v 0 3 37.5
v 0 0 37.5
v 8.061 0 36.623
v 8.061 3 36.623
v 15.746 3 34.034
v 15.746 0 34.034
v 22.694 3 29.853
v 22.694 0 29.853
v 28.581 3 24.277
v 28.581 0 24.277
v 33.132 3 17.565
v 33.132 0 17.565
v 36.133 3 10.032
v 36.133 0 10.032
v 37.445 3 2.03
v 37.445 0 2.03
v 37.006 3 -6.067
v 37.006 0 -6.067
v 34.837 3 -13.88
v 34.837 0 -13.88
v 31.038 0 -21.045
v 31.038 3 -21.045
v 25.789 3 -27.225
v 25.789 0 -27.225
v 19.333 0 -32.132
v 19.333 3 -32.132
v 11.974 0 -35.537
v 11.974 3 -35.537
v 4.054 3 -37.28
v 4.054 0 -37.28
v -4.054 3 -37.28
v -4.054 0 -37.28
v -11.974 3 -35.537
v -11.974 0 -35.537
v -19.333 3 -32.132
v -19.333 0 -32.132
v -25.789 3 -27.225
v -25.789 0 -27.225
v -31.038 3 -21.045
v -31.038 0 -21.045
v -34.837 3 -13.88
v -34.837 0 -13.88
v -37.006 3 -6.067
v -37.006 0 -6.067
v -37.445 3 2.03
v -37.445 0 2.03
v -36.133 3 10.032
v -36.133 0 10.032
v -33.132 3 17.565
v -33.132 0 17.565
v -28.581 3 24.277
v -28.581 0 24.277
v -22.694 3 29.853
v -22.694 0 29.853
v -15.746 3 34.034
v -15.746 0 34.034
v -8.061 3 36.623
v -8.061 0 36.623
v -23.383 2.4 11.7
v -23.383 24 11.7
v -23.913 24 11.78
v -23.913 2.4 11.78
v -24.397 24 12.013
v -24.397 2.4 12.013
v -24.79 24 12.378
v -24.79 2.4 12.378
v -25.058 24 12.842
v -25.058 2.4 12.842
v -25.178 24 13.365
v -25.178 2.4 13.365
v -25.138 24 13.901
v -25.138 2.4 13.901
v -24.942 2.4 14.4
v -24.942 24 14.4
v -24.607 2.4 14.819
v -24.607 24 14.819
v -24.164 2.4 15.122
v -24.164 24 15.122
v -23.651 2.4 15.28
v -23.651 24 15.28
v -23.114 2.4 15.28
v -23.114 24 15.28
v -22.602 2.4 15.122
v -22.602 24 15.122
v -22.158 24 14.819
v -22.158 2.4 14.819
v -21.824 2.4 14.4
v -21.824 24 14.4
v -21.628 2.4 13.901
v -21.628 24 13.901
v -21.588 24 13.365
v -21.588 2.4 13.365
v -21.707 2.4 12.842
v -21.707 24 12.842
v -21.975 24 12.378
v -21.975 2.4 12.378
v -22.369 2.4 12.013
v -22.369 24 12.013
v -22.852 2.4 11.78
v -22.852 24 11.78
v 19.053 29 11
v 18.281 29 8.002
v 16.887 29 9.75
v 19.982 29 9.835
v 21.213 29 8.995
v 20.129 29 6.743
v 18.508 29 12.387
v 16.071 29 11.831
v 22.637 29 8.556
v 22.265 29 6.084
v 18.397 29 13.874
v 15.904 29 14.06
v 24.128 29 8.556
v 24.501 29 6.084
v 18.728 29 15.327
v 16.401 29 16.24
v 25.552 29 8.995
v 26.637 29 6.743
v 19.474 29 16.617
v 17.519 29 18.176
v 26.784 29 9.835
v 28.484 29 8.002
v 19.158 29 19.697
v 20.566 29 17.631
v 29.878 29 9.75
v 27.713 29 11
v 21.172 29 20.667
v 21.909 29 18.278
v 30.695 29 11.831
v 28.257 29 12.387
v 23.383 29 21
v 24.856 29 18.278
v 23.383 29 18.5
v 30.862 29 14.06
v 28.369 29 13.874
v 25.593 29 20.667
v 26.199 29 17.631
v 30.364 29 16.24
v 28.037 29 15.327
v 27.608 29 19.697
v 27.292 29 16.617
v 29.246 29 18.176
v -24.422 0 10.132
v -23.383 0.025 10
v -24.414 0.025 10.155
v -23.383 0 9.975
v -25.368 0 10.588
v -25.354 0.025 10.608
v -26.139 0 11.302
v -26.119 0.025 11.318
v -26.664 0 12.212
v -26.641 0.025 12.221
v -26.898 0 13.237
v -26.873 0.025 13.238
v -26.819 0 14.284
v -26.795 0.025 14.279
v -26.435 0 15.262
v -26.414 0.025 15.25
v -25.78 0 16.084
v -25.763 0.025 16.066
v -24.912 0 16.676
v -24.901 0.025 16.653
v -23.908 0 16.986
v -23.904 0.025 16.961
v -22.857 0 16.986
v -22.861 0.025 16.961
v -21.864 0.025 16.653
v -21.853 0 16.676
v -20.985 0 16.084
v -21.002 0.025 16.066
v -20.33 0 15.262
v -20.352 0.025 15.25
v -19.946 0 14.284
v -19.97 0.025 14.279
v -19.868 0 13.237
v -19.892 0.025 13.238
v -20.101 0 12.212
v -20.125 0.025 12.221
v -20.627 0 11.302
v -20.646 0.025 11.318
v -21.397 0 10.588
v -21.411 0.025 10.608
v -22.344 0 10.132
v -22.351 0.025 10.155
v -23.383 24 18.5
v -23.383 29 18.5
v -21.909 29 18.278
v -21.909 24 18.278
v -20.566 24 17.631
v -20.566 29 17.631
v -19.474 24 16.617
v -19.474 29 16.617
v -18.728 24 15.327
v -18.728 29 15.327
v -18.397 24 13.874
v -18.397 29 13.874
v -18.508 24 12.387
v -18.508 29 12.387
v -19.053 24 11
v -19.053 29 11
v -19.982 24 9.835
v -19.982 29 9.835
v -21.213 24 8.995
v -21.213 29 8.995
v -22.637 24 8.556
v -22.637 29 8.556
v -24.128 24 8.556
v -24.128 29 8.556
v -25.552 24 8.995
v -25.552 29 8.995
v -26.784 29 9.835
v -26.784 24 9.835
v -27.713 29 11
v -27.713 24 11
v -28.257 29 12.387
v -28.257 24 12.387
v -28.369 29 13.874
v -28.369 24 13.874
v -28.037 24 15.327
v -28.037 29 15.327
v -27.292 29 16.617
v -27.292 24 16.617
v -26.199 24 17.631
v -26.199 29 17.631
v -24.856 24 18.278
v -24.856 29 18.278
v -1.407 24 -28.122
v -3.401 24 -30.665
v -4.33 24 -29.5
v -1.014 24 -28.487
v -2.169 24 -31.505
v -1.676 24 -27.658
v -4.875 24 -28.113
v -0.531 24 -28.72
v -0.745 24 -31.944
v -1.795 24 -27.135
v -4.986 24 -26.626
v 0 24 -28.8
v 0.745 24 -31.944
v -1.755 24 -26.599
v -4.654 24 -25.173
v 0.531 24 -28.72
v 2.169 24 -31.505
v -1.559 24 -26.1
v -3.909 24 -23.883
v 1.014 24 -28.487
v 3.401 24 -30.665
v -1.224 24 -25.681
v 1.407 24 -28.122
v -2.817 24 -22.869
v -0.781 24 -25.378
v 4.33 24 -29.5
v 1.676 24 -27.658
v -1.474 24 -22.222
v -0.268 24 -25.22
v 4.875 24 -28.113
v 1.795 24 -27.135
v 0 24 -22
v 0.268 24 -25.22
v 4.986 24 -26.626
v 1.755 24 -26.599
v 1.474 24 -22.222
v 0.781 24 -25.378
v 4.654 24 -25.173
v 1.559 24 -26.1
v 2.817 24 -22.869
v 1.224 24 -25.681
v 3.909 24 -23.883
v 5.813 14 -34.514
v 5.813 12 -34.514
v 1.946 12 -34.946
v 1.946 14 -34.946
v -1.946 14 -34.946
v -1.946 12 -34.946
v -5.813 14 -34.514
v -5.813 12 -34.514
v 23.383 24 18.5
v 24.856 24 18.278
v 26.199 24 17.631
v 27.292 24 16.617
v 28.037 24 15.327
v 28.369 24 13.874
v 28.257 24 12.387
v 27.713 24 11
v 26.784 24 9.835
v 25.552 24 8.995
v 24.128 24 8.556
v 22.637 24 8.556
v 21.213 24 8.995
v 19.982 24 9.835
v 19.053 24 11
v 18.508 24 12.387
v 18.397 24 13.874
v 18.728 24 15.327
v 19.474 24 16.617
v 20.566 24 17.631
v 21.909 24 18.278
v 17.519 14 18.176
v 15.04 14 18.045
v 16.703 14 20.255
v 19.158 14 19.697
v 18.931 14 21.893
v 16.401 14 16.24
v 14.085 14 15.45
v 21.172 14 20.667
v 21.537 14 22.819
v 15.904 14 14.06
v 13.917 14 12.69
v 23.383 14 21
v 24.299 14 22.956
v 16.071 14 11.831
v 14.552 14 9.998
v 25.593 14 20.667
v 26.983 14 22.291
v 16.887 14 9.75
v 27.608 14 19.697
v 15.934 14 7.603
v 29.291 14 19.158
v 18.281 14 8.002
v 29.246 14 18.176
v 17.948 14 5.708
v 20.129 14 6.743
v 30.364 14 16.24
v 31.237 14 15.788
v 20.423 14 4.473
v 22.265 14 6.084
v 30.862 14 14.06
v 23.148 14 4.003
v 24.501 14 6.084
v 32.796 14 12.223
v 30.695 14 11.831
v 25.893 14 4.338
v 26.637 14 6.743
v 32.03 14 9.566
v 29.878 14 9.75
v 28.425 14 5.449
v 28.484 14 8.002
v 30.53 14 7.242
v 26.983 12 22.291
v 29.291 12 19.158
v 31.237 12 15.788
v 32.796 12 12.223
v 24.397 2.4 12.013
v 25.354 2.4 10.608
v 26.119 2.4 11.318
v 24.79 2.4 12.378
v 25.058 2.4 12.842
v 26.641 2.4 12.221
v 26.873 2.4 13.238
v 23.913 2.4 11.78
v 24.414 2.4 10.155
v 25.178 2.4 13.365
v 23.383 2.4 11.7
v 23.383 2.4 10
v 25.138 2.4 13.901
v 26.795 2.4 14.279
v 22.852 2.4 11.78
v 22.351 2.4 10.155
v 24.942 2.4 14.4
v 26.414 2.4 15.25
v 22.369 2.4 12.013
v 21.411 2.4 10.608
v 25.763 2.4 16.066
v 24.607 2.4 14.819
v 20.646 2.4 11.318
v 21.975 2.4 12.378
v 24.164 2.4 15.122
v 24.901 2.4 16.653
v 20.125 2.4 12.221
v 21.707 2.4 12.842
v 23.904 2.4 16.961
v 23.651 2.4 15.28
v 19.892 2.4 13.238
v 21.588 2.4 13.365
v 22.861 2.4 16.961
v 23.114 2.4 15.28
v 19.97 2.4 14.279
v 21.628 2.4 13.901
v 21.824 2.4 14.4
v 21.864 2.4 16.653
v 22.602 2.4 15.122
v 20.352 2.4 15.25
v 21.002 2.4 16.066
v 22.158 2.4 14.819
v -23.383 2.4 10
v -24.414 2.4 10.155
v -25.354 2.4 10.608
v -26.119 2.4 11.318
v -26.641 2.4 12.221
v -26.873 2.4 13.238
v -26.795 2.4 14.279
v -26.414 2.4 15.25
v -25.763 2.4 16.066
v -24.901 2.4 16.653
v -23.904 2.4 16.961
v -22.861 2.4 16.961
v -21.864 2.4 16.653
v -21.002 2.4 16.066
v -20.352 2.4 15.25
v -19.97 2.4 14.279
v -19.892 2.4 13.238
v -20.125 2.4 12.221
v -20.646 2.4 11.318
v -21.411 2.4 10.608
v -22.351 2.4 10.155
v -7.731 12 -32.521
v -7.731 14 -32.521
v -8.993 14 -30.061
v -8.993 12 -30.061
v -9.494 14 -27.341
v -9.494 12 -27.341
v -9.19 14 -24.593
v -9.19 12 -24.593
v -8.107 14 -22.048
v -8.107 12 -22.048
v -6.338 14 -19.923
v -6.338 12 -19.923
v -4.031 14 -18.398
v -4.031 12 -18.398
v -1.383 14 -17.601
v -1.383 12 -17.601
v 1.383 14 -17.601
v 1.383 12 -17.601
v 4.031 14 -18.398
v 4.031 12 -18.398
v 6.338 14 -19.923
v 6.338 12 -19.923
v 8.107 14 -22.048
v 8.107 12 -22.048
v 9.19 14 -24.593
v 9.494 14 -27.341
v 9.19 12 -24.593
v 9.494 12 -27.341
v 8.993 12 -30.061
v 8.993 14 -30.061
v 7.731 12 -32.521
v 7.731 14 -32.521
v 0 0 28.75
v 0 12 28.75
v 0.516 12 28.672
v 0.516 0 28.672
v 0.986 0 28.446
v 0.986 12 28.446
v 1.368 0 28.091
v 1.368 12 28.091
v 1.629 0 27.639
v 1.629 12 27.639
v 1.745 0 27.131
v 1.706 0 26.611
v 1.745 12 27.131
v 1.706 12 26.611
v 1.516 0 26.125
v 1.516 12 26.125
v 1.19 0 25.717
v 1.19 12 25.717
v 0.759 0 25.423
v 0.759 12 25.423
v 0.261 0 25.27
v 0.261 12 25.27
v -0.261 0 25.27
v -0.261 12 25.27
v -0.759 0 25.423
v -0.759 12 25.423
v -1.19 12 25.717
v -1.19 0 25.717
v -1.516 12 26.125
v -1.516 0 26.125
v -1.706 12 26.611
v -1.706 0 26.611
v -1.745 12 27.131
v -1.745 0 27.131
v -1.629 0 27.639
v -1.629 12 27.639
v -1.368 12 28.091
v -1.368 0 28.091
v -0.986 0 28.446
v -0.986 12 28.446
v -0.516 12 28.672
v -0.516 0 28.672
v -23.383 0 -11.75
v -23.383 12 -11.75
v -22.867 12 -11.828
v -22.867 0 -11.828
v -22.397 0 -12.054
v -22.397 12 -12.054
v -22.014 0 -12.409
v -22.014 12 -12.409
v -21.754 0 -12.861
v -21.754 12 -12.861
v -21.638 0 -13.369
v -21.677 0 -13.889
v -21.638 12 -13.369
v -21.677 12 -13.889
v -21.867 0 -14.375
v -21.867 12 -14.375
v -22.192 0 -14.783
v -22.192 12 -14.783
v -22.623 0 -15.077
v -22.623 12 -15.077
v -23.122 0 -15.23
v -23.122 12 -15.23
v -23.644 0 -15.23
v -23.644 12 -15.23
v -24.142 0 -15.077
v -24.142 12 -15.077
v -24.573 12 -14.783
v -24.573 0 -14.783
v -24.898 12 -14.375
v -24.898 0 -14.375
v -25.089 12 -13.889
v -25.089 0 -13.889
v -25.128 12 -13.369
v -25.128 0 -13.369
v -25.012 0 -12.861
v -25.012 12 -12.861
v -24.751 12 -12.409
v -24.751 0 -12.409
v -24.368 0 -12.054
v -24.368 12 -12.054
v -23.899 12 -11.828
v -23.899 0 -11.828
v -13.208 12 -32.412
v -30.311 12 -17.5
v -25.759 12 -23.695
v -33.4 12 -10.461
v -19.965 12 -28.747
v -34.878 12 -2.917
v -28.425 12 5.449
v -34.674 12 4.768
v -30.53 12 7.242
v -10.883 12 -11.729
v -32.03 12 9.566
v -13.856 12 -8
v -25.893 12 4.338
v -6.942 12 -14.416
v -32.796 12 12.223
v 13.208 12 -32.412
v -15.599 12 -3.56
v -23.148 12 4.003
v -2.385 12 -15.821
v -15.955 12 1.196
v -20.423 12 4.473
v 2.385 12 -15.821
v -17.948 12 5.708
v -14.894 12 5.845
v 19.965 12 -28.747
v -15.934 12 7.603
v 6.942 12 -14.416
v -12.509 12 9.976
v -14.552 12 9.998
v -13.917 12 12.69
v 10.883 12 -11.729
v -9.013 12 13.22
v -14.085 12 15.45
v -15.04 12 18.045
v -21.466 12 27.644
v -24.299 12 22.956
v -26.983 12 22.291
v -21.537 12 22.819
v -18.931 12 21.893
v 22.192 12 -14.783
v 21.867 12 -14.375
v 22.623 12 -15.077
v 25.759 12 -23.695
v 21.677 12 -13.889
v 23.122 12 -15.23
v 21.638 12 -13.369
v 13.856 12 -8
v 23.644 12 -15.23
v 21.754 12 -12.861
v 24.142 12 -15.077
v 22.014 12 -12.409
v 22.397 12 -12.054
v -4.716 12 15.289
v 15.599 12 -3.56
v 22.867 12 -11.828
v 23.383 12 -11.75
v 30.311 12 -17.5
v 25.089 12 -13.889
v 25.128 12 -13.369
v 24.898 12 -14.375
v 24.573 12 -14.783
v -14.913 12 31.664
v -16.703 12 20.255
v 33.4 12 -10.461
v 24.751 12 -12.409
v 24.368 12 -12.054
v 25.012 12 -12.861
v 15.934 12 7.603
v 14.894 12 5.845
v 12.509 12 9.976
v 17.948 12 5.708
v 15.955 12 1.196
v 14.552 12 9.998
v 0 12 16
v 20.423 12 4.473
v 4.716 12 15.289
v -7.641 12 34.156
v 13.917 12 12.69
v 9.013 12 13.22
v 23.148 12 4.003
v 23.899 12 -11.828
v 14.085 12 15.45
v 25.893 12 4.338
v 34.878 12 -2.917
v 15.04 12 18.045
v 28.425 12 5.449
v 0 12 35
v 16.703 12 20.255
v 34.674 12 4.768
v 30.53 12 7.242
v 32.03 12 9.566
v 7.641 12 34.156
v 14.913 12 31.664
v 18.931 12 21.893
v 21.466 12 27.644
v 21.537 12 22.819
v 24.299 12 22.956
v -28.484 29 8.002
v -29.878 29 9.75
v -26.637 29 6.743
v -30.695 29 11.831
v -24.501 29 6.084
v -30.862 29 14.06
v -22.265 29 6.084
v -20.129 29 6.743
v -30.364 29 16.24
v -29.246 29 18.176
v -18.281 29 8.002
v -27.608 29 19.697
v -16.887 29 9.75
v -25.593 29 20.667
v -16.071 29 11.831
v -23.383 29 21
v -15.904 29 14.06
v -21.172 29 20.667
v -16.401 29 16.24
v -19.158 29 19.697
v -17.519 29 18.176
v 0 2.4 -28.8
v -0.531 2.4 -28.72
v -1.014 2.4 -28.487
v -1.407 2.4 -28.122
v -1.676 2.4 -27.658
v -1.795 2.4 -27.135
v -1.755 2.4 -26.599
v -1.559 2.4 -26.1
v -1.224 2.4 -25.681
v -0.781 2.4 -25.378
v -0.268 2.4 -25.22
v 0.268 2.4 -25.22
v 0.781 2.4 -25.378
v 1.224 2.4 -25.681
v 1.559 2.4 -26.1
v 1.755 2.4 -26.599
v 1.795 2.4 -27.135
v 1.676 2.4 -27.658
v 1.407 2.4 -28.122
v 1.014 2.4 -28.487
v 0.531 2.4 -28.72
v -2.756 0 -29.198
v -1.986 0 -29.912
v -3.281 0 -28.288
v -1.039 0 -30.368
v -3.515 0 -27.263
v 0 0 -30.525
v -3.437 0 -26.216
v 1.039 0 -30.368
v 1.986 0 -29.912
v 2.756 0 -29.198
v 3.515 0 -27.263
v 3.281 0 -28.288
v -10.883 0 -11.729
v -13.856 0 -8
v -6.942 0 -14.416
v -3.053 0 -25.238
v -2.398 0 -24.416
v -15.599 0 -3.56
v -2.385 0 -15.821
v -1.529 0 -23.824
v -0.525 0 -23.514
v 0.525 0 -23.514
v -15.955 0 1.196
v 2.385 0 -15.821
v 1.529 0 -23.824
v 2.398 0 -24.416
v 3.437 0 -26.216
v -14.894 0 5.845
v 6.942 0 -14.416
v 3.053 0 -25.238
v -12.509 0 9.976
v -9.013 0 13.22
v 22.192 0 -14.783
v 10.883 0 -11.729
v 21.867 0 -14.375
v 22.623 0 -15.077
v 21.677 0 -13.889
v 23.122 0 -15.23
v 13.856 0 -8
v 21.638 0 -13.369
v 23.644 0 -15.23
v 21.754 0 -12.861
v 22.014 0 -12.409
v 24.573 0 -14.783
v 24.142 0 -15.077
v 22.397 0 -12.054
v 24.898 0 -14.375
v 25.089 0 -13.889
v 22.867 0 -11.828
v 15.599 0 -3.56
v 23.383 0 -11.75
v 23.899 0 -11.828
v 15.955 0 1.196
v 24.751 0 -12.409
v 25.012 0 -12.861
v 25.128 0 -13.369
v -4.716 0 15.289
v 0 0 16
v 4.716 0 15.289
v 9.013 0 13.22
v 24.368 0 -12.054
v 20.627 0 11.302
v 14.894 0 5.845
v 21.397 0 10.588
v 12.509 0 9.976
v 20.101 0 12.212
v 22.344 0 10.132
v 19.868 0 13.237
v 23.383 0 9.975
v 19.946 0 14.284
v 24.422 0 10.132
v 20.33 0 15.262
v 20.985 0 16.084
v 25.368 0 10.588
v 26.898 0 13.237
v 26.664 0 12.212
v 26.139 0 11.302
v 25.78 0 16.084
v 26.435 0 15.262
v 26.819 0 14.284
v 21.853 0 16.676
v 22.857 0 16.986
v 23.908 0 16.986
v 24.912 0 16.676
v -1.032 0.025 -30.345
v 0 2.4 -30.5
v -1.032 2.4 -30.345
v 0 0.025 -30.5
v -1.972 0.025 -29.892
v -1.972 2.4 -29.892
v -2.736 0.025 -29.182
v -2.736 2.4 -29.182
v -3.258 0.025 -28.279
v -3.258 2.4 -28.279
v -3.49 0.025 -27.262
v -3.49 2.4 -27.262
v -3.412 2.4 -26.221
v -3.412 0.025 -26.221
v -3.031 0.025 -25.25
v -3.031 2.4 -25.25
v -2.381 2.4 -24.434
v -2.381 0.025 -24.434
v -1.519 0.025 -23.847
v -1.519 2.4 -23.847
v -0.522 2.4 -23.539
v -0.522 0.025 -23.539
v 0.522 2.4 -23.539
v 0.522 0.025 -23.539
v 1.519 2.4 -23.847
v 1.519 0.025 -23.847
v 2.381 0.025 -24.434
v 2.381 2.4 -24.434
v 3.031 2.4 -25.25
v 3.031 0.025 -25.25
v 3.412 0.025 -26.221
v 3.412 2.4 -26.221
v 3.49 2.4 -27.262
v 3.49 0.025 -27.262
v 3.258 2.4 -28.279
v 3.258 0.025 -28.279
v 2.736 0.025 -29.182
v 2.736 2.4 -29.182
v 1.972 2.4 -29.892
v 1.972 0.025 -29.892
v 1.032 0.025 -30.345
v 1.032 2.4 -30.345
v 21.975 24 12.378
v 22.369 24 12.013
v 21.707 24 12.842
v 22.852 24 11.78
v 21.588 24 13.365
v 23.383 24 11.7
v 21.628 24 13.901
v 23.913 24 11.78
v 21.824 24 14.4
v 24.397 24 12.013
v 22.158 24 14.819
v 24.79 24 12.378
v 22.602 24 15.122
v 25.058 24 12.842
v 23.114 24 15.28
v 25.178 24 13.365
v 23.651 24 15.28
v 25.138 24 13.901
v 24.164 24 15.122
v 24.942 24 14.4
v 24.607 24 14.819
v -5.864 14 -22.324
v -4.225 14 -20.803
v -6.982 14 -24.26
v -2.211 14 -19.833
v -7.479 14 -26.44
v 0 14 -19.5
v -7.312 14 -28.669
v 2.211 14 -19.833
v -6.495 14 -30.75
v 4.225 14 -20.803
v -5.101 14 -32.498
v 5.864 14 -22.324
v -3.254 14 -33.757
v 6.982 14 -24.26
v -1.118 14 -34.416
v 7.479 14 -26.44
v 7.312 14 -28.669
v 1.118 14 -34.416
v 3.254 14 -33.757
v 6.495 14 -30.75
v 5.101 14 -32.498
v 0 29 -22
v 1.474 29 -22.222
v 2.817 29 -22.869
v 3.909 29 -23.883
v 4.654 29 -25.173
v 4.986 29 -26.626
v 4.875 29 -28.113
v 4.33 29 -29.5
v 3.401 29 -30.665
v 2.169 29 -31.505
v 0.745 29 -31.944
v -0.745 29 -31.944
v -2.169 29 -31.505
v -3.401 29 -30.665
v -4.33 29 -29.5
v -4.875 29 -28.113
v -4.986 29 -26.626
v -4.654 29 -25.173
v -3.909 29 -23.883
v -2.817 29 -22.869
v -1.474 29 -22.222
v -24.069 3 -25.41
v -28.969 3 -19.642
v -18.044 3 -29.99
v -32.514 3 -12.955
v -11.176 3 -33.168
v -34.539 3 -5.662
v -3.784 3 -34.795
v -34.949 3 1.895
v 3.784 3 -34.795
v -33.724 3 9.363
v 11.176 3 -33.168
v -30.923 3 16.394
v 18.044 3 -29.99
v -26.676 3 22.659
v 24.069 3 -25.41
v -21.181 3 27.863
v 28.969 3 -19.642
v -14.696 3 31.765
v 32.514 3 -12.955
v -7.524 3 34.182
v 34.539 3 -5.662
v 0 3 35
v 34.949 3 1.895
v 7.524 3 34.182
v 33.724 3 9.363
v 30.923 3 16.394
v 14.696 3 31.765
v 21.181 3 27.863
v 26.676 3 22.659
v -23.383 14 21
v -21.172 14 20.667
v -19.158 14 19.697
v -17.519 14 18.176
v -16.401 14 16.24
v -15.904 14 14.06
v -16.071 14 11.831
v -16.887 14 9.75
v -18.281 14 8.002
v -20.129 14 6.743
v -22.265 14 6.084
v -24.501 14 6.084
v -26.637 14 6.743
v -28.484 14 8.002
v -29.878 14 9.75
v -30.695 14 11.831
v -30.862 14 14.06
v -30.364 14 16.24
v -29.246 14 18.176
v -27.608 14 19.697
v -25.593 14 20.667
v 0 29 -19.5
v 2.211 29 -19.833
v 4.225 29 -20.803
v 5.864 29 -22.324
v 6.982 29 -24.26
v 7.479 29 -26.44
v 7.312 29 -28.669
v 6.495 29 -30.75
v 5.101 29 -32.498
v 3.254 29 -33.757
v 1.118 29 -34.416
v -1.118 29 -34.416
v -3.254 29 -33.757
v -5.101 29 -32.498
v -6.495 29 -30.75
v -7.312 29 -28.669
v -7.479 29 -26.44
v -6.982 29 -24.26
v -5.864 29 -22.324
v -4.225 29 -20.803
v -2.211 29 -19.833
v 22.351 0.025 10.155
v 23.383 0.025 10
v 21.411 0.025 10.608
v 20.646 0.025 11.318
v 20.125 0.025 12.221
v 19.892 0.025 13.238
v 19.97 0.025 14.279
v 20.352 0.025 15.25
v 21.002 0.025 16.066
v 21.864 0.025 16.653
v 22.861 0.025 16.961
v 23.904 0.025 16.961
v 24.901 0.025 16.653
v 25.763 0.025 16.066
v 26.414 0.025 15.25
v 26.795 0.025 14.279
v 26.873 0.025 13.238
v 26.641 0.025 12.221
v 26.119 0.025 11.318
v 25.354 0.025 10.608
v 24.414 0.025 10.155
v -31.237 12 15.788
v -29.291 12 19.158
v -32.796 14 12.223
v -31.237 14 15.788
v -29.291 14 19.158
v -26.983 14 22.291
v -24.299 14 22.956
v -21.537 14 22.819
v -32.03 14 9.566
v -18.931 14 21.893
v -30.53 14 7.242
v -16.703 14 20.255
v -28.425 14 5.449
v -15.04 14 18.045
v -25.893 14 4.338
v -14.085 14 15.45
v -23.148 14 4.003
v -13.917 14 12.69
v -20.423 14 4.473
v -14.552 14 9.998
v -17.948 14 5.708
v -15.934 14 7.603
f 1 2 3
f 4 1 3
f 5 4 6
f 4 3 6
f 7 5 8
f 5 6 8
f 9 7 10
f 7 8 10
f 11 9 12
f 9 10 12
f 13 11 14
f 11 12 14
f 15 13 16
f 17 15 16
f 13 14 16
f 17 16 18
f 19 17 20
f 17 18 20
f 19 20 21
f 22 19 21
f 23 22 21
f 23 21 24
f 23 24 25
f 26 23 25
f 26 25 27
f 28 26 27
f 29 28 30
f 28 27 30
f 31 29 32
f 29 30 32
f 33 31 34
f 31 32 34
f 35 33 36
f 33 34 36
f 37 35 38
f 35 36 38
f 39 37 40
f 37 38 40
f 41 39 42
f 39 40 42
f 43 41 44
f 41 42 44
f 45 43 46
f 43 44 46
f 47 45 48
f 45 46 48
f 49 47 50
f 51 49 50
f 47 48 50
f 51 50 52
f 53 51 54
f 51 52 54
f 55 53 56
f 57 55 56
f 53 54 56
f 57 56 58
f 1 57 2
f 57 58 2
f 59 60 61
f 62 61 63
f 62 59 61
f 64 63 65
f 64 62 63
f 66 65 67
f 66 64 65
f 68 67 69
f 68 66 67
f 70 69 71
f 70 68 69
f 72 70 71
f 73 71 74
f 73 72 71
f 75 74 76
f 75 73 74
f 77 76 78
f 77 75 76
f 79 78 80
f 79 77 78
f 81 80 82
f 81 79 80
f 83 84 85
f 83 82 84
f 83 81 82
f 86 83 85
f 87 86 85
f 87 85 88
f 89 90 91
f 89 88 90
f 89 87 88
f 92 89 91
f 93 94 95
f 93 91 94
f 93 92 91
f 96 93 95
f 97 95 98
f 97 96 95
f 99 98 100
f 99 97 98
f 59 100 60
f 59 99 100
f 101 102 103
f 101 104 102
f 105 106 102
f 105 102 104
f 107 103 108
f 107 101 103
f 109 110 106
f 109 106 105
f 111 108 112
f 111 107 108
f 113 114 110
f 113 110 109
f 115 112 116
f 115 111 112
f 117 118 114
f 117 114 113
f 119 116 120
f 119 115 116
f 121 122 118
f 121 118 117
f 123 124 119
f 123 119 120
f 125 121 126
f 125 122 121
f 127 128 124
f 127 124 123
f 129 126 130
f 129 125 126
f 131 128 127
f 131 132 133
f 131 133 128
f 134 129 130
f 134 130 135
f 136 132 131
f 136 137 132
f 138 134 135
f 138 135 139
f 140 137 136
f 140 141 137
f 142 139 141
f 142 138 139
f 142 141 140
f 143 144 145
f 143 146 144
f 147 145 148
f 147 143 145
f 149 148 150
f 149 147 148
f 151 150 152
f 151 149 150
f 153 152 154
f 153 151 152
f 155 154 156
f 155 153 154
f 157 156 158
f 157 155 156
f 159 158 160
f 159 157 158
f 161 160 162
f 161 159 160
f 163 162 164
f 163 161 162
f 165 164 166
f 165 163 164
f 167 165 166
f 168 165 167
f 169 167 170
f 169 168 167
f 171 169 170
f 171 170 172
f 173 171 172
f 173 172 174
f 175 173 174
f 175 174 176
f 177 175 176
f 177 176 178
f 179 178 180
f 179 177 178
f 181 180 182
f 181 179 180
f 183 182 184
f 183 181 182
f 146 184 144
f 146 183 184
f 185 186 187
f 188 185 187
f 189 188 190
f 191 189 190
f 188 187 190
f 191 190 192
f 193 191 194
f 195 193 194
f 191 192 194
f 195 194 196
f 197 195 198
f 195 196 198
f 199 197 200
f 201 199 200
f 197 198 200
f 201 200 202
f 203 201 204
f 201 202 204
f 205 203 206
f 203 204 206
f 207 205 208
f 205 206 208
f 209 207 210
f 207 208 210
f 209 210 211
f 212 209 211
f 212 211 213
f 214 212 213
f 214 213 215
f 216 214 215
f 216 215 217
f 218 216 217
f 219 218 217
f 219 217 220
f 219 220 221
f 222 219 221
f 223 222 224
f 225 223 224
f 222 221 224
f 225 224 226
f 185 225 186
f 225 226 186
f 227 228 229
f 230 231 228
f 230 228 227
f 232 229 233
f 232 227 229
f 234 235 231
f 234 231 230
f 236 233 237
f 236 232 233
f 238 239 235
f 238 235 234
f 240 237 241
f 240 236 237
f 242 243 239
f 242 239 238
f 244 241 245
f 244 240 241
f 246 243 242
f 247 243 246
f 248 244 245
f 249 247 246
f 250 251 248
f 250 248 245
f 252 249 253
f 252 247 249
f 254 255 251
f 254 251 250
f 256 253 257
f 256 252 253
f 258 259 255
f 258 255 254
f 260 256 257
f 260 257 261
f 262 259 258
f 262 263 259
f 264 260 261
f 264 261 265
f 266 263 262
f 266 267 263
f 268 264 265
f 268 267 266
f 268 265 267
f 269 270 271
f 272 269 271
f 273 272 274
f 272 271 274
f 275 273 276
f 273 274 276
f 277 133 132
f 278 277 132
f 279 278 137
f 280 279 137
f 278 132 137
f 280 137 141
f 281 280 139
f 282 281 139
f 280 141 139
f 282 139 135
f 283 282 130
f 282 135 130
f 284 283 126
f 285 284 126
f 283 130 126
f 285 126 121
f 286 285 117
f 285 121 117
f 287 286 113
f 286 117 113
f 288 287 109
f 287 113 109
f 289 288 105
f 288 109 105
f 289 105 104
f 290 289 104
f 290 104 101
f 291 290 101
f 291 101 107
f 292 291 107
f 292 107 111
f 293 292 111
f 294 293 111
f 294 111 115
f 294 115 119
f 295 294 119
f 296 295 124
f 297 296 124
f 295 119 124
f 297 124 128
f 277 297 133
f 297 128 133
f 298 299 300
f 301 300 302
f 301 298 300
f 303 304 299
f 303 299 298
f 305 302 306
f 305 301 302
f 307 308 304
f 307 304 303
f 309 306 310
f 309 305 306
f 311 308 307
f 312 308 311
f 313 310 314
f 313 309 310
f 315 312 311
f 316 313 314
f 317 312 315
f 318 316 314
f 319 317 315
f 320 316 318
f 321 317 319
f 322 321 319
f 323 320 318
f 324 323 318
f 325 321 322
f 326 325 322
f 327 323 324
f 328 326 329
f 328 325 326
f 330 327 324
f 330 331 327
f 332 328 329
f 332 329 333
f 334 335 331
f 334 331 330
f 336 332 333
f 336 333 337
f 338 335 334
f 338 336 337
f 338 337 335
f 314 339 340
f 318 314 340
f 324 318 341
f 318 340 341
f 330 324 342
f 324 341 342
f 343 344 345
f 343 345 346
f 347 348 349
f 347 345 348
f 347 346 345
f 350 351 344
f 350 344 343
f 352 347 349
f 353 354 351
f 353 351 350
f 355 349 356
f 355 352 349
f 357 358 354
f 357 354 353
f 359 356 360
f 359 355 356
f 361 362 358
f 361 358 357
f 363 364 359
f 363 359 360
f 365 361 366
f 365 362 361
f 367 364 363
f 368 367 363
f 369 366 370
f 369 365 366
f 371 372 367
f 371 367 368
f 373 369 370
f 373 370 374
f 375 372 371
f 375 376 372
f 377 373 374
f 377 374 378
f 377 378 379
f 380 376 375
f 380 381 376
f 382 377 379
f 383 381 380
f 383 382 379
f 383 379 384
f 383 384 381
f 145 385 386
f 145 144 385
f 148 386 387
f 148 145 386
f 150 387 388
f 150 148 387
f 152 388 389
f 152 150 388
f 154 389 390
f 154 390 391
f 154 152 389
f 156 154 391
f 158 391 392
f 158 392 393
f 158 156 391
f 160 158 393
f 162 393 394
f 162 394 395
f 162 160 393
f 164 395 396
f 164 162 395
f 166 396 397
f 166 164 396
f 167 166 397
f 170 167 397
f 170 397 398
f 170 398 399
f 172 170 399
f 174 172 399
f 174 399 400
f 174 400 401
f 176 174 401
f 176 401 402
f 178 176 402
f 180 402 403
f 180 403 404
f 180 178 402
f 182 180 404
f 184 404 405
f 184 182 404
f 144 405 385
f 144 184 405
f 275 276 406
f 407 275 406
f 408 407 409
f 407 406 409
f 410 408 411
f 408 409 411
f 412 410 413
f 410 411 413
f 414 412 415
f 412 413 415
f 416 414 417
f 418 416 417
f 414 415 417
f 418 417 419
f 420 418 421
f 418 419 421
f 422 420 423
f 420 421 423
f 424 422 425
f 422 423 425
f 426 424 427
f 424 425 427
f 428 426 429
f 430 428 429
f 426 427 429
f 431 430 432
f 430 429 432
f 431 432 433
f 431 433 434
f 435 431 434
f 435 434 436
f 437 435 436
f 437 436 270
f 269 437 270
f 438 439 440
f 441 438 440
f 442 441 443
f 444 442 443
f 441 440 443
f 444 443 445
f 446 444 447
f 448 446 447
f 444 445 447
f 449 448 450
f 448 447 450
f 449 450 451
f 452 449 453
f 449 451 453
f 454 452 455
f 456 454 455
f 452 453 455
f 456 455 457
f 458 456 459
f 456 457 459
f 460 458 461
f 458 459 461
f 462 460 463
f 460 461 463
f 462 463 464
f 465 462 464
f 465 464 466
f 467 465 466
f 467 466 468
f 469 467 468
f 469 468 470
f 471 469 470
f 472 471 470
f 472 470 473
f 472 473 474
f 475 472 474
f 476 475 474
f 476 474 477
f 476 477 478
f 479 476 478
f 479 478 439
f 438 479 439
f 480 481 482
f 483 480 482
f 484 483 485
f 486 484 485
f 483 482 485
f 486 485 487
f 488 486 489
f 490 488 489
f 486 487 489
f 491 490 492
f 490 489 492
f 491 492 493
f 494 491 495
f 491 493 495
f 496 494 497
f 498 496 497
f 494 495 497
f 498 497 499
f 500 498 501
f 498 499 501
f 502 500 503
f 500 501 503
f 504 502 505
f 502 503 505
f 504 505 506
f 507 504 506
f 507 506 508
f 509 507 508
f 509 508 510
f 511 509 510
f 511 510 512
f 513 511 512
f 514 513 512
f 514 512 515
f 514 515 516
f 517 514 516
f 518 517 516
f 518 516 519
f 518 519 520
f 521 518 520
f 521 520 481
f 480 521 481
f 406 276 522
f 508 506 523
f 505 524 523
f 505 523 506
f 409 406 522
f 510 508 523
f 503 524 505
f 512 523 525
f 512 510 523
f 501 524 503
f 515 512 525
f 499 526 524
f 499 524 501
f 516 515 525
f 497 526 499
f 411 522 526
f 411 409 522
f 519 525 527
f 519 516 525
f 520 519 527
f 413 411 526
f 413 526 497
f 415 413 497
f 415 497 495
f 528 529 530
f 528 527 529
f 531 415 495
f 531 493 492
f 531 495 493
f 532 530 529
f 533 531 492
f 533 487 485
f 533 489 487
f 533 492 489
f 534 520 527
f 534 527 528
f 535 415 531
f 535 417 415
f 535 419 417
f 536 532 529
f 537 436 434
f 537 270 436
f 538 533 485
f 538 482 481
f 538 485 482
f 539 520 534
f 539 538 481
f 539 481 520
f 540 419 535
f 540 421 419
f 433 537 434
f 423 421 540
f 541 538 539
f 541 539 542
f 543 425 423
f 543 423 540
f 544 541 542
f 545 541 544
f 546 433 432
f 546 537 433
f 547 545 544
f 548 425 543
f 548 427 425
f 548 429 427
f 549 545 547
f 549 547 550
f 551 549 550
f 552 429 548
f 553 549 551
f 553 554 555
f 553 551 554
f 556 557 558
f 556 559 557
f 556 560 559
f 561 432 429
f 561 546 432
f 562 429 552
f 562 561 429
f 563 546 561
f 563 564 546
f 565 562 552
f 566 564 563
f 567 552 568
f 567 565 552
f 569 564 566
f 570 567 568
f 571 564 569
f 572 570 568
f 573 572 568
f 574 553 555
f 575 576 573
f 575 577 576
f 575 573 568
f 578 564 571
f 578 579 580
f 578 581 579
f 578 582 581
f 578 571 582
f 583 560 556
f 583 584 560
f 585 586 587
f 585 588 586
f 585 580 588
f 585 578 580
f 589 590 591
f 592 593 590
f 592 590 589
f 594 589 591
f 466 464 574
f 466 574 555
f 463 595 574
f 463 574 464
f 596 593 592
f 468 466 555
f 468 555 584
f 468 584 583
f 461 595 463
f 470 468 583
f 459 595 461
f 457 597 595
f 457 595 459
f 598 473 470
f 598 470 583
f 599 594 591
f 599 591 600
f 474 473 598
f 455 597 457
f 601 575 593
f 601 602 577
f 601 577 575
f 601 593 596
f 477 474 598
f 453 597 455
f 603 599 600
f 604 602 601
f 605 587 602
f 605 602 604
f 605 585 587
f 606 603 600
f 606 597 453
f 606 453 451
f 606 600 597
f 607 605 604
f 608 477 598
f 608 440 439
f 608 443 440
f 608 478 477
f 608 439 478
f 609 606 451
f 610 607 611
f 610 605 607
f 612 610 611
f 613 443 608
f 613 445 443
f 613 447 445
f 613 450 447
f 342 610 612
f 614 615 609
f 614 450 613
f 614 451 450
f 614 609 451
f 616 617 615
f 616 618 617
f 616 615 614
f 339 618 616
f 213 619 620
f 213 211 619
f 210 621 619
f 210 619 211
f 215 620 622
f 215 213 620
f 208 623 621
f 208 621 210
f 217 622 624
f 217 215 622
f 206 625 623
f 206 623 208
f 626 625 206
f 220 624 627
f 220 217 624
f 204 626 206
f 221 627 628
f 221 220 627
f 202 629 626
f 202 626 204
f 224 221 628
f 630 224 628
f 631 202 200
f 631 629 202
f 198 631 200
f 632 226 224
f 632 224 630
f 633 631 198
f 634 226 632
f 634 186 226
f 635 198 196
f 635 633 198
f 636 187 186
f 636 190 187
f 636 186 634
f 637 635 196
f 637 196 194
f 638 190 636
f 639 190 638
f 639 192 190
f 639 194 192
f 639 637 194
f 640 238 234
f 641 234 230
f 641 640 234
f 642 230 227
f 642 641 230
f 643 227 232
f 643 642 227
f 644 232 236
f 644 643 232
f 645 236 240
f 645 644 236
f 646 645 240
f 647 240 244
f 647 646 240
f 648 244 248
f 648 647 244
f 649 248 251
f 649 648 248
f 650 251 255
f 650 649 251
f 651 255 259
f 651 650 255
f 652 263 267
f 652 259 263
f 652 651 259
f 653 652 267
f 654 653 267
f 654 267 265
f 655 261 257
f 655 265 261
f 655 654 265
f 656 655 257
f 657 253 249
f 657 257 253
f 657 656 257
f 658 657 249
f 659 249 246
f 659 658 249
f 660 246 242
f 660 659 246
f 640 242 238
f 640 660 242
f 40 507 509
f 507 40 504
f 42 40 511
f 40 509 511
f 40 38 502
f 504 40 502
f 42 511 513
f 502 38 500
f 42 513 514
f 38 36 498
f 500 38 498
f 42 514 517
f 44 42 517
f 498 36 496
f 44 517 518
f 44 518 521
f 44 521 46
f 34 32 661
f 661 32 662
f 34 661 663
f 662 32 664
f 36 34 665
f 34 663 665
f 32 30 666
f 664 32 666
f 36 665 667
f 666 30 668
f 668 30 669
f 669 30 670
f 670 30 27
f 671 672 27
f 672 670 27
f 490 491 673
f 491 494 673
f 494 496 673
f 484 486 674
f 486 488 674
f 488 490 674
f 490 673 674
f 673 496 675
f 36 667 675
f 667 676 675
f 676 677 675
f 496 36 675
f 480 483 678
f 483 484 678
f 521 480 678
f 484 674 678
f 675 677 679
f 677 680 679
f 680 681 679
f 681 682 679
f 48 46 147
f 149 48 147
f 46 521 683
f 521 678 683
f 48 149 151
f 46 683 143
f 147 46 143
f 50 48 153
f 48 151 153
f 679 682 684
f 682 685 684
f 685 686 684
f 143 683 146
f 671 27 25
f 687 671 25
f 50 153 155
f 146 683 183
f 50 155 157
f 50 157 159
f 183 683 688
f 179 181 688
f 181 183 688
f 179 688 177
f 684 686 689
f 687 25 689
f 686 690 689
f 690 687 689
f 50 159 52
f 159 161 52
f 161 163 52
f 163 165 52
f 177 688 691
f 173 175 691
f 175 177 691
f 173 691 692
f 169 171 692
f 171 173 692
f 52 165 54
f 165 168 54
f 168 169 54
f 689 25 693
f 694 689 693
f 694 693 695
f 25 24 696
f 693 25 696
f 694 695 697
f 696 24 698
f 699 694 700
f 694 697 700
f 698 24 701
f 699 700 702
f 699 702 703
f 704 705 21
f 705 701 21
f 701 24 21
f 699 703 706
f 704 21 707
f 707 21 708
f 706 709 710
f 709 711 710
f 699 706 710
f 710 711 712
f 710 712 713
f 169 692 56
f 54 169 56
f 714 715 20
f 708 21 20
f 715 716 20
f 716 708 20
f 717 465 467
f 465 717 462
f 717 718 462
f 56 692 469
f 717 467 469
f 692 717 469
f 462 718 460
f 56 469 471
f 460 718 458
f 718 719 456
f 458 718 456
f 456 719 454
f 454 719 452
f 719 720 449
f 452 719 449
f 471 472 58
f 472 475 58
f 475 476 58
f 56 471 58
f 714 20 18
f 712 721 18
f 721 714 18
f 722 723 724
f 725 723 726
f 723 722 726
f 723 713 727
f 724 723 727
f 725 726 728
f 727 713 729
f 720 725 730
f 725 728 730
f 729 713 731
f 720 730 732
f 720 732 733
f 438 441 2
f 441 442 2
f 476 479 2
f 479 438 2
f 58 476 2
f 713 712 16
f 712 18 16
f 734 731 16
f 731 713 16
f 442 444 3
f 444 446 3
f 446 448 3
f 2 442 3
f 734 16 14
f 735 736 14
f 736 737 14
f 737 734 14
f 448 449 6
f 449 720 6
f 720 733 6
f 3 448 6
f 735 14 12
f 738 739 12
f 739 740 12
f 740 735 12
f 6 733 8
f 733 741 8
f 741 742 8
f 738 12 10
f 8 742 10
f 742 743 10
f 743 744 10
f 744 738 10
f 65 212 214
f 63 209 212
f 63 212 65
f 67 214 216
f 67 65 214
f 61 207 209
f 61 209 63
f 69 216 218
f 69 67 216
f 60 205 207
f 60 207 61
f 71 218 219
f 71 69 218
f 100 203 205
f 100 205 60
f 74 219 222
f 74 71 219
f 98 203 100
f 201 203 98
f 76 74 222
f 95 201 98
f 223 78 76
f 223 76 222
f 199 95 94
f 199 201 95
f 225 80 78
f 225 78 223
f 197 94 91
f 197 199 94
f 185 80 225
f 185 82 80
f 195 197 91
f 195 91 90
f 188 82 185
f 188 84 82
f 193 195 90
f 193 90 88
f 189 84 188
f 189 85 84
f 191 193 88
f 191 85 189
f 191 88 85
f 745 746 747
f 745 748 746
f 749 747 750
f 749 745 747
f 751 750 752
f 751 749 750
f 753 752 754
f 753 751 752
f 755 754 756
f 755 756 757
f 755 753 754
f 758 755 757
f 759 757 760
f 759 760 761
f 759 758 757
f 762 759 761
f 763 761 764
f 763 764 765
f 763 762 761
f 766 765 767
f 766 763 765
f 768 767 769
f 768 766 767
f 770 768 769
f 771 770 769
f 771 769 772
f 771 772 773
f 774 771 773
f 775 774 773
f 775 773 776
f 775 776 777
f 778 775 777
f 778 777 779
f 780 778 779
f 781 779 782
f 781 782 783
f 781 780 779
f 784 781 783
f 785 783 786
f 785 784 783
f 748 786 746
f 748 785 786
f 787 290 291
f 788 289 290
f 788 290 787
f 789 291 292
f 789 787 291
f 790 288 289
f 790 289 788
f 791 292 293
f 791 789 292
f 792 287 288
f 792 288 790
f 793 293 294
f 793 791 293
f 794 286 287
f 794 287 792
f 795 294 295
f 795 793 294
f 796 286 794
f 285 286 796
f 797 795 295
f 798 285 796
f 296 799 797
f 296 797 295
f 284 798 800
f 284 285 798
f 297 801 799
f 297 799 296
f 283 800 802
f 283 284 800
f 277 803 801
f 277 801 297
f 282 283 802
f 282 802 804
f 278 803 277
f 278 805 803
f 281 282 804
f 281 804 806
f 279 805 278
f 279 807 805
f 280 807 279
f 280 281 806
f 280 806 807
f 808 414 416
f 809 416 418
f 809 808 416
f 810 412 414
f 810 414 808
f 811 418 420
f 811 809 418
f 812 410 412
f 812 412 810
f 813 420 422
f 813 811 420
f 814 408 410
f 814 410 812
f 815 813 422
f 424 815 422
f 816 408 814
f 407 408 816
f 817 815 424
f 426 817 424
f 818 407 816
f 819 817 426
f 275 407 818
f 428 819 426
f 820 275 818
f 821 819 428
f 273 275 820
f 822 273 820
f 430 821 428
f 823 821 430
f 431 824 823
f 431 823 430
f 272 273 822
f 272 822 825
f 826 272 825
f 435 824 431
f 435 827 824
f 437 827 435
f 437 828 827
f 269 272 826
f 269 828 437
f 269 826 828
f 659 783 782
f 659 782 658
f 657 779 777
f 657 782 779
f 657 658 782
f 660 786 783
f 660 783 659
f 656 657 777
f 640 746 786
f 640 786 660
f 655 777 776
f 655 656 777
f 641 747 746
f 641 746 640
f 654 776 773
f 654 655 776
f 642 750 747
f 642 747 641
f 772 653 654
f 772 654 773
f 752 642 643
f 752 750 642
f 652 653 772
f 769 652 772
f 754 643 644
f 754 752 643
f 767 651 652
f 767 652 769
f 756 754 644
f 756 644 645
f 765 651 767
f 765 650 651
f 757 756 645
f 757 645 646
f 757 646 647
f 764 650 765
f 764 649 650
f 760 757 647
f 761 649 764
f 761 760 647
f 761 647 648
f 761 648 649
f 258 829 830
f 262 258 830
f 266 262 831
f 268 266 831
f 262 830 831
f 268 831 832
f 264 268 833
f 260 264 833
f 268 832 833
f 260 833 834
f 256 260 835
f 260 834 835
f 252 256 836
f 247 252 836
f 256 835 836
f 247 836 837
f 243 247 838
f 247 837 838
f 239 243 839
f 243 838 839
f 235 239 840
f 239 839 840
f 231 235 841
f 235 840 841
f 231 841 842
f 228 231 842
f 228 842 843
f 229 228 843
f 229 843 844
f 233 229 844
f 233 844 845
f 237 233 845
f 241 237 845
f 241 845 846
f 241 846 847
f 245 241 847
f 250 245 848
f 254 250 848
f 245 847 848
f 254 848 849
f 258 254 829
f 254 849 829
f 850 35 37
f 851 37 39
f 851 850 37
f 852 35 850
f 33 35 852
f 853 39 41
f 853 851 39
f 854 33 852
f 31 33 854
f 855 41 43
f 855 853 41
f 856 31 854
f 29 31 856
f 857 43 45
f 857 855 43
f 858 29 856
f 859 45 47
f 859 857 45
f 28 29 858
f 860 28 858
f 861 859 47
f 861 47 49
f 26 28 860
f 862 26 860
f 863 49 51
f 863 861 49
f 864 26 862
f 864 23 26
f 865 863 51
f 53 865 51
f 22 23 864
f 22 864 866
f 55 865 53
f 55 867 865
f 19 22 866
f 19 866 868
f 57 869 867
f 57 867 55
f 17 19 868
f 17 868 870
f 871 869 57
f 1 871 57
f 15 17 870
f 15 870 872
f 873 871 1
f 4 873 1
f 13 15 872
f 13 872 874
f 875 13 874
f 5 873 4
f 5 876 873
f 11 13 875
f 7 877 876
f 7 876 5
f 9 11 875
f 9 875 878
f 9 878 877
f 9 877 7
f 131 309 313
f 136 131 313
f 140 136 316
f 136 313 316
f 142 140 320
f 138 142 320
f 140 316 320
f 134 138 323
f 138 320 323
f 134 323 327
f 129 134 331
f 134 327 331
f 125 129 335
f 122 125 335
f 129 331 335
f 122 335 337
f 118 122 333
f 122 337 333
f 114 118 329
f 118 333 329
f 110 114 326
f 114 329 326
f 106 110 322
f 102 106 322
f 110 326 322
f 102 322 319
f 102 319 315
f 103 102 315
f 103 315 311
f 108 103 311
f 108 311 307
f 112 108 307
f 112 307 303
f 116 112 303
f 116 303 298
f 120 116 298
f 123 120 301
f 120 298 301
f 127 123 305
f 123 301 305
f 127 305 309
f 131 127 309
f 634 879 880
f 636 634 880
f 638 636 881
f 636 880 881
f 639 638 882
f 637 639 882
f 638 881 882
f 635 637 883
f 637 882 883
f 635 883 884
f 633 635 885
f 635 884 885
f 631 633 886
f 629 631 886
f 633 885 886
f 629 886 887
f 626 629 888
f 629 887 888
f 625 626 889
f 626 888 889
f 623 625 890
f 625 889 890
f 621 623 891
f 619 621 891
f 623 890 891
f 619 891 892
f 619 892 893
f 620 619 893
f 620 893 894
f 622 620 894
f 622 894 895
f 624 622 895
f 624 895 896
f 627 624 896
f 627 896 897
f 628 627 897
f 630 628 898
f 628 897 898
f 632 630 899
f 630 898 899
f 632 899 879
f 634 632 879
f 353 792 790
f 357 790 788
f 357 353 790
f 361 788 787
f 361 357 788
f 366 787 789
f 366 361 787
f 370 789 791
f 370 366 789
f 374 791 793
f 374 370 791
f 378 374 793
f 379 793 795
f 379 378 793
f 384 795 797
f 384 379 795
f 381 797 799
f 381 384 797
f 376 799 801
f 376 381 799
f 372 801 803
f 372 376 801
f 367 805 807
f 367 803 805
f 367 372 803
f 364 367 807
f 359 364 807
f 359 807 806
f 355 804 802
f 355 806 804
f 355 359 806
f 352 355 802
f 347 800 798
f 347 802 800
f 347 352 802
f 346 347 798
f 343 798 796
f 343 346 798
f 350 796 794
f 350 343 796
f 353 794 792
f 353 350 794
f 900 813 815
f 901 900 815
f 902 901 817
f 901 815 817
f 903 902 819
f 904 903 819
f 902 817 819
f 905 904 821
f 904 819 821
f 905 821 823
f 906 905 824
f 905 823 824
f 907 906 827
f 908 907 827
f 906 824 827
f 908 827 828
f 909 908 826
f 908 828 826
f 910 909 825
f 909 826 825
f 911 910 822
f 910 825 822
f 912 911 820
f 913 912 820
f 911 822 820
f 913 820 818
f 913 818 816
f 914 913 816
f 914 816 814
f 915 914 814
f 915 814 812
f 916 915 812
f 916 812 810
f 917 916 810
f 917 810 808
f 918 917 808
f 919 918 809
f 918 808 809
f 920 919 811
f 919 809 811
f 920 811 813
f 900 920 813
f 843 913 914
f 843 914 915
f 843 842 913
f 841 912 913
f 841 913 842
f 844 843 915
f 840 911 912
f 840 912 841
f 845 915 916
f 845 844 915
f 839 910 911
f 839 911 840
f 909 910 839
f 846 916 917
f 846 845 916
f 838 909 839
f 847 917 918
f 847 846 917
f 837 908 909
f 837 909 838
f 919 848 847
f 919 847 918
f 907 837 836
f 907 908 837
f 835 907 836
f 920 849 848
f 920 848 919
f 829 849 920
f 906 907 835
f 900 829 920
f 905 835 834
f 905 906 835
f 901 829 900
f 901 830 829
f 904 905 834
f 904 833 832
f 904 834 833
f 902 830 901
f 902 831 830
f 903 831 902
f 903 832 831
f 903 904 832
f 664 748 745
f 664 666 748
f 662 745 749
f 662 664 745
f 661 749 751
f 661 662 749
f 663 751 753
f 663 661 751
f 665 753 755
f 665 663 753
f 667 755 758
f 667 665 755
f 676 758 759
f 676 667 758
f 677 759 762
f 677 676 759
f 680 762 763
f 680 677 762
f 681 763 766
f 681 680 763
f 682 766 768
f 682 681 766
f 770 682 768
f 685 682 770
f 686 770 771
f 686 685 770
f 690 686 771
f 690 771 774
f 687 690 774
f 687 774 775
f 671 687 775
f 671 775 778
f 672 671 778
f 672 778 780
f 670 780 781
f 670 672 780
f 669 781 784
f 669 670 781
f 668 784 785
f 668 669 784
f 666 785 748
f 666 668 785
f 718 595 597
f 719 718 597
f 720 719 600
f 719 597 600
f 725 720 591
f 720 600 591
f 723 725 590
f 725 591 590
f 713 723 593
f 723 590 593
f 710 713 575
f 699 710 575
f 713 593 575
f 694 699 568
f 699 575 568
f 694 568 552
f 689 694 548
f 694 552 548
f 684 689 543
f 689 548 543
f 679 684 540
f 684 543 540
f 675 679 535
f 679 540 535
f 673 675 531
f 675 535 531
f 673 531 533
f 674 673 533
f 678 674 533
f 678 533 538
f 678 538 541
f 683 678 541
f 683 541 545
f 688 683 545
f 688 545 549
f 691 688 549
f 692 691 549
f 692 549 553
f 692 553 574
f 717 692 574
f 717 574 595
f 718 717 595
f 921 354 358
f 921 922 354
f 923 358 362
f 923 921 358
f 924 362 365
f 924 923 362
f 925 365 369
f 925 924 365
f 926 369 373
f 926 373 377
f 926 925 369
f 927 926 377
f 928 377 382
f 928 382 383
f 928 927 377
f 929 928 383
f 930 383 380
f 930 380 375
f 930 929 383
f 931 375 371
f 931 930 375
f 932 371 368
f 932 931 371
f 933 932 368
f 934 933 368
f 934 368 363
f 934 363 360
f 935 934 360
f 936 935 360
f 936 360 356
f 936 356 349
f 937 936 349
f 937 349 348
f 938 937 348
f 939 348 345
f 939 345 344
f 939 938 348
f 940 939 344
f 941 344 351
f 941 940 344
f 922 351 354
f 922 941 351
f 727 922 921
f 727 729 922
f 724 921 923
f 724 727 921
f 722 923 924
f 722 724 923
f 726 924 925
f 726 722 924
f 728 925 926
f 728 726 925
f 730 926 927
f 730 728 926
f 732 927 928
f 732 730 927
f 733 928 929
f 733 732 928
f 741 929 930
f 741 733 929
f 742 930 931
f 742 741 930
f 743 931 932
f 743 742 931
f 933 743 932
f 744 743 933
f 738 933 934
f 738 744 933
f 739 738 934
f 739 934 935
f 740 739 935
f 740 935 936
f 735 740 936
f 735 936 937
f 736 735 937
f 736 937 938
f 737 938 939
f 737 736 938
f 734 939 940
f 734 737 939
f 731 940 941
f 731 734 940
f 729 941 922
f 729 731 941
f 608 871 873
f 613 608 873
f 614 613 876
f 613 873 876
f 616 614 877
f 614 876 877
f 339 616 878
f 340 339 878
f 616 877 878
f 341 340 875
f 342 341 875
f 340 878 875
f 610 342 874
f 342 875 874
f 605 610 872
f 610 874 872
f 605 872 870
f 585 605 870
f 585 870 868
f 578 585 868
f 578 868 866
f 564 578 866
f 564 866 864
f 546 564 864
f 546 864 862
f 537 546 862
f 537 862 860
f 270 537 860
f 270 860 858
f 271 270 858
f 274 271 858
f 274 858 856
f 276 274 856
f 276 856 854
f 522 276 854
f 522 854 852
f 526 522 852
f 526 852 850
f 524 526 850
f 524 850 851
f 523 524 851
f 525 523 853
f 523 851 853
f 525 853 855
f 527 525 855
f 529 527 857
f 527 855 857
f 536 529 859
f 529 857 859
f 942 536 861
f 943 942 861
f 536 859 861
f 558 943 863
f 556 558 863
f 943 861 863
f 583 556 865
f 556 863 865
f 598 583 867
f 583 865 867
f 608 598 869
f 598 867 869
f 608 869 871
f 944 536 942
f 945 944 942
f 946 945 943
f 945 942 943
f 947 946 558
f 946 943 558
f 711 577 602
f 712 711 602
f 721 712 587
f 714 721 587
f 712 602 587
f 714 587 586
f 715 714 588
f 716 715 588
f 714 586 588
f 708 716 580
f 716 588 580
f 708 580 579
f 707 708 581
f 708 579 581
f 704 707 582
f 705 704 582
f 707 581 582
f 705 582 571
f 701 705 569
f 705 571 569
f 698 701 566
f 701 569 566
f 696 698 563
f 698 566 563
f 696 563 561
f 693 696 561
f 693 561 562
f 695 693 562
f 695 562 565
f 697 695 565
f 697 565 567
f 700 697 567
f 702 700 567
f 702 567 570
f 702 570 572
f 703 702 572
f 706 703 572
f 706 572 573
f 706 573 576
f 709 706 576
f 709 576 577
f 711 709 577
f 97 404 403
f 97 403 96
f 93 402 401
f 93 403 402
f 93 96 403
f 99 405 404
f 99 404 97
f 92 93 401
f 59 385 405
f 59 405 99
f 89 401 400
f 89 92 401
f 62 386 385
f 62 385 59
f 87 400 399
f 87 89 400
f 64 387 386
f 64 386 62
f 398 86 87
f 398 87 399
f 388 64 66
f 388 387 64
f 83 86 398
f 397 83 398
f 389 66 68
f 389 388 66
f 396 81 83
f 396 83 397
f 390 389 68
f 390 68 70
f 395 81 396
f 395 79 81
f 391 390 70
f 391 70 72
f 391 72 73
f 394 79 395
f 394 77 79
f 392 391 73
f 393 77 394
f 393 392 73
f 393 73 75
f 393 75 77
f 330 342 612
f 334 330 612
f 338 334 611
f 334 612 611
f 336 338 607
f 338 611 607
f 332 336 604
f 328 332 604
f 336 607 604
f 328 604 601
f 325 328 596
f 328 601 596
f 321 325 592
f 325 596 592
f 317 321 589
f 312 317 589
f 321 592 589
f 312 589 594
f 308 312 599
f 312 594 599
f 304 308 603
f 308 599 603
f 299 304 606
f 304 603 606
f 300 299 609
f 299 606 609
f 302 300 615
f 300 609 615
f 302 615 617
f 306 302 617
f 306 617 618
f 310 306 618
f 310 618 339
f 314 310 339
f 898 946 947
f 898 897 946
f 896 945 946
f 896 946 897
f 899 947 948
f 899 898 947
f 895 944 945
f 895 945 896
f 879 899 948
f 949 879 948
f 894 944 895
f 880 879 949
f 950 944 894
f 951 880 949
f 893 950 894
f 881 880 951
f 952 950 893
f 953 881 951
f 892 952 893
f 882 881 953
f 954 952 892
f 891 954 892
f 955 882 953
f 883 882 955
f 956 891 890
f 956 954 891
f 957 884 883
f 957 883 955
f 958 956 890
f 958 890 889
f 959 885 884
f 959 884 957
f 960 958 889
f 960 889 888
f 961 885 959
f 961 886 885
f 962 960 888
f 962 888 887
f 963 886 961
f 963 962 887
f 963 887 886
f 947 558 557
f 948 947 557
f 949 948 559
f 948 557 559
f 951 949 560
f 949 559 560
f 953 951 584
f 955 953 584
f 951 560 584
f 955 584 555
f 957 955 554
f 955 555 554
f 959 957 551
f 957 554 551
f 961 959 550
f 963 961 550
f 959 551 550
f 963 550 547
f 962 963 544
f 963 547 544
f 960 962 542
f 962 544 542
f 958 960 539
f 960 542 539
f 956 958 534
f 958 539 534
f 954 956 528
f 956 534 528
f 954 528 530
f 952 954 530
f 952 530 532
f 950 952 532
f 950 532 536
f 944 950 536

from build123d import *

# Parameters (mm, degrees)
SKETCH1_R                                     = 37.5
BOSS_EXTRUDE1_DEPTH                           = 3
SKETCH1_3_R                                   = 35
BOSS_EXTRUDE2_DEPTH                           = 12
SKETCH13_R                                    = 16
CUT_EXTRUDE6_DEPTH                            = 55.373706881
BOSS_EXTRUDE9_DEPTH                           = 2
SKETCH25_R                                    = 7.5
BOSS_EXTRUDE10_DEPTH                          = 15
SKETCH26_R                                    = 5
CUT_EXTRUDE9_DEPTH                            = 5
CBORE_FOR_M3_PAN_HEAD_MACHINE_SCREW1_AT_COUNT = 2
CBORE_FOR_M3_PAN_HEAD_MACHINE_SCREW1_AT_PITCH = 46.765371804
CBORE_FOR_M3_PAN_HEAD_MACHINE_SCREW1_2_COUNT  = 2
CBORE_FOR_M3_PAN_HEAD_MACHINE_SCREW1_2_PITCH  = 46.765371804
SKETCH29_R                                    = 1.75
CUT_EXTRUDE10_DEPTH                           = 56.691112397


with BuildPart() as part:
    # Sketch1 → Boss-Extrude1 (new body)
    with BuildSketch(Plane(origin=(0, 0, 0), x_dir=(1, 0, 0), z_dir=(0, 1, 0))):
        Circle(SKETCH1_R)
    extrude(amount=BOSS_EXTRUDE1_DEPTH)

    # Sketch1<3> → Boss-Extrude2 (add)
    with BuildSketch(Plane(origin=(0, 0, 0), x_dir=(1, 0, 0), z_dir=(0, 1, 0))):
        Circle(SKETCH1_3_R)
    extrude(amount=BOSS_EXTRUDE2_DEPTH)

    # Sketch13 → Cut-Extrude6 (cut, through all)
    with BuildSketch(Plane(origin=(0, 12, 0), x_dir=(1, 0, 0), z_dir=(0, 1, 0))):
        Circle(SKETCH13_R)
    extrude(amount=-CUT_EXTRUDE6_DEPTH, mode=Mode.SUBTRACT)

    # Sketch24 → Boss-Extrude9 (add)
    with BuildSketch(Plane(origin=(0, 12, 0), x_dir=(1, 0, 0), z_dir=(0, 1, 0))):
        with BuildLine():
            ThreePointArc((5.813043417, 34.513888889), (0, 35), (-5.813043417, 34.513888889))
            ThreePointArc((-5.813043417, 34.513888889), (0, 17.5), (5.813043417, 34.513888889))
        make_face()
        with BuildLine():
            ThreePointArc((-26.983382853, -22.291187717), (-15.155444566, -8.75), (-32.79642627, -12.222701172))
            ThreePointArc((-32.79642627, -12.222701172), (-30.310889132, -17.5), (-26.983382853, -22.291187717))
        make_face()
        with BuildLine():
            ThreePointArc((26.983382853, -22.291187717), (30.310889132, -17.5), (32.79642627, -12.222701172))
            ThreePointArc((32.79642627, -12.222701172), (15.155444566, -8.75), (26.983382853, -22.291187717))
        make_face()
    extrude(amount=BOSS_EXTRUDE9_DEPTH)

    # Sketch25 → Boss-Extrude10 (add)
    with BuildSketch(Plane(origin=(0, 14, 0), x_dir=(1, 0, 0), z_dir=(0, 1, 0))):
        with Locations((0, 27)):
            Circle(SKETCH25_R)
        with Locations((23.382685902, -13.5)):
            Circle(SKETCH25_R)
        with Locations((-23.382685902, -13.5)):
            Circle(SKETCH25_R)
    extrude(amount=BOSS_EXTRUDE10_DEPTH)

    # Sketch26 → Cut-Extrude9 (cut)
    with BuildSketch(Plane(origin=(0, 29, 0), x_dir=(1, 0, 0), z_dir=(0, 1, 0))):
        with Locations((0, 27)):
            Circle(SKETCH26_R)
        with Locations((23.382685902, -13.5)):
            Circle(SKETCH26_R)
        with Locations((-23.382685902, -13.5)):
            Circle(SKETCH26_R)
    extrude(amount=-CUT_EXTRUDE9_DEPTH, mode=Mode.SUBTRACT)

    # Sketch28 → CBORE for M3 Pan Head Machine Screw1 (revolve, cut)
    with BuildSketch(Plane(origin=(0, 0, -27), x_dir=(0, 0, -1), z_dir=(1, 0, 0))):
        Polygon((0, 0), (0, 29), (1.8, 29), (1.8, 2.4), (3.5, 2.4), (3.5, 0.025), (3.525, 0), align=None)
    cbore_for_m3_pan_head_machine_screw1 = revolve(axis=Axis((0, -6.35, -27), (0, 1, 0)), mode=Mode.SUBTRACT)

    # CBORE for M3 Pan Head Machine Screw1 at: CBORE for M3 Pan Head Machine Screw1 ×2
    with Locations(*[Vector(-0.5000000000000369, 0, 0.8660254037844174) * (i * CBORE_FOR_M3_PAN_HEAD_MACHINE_SCREW1_AT_PITCH) for i in range(1, CBORE_FOR_M3_PAN_HEAD_MACHINE_SCREW1_AT_COUNT)]):
        add(cbore_for_m3_pan_head_machine_screw1, mode=Mode.SUBTRACT)

    # CBORE for M3 Pan Head Machine Screw1 2: CBORE for M3 Pan Head Machine Screw1 ×2
    with Locations(*[Vector(0.49999999999996353, 0, 0.8660254037844598) * (i * CBORE_FOR_M3_PAN_HEAD_MACHINE_SCREW1_2_PITCH) for i in range(1, CBORE_FOR_M3_PAN_HEAD_MACHINE_SCREW1_2_COUNT)]):
        add(cbore_for_m3_pan_head_machine_screw1, mode=Mode.SUBTRACT)

    # Sketch29 → Cut-Extrude10 (cut, through all)
    with BuildSketch(Plane(origin=(0, 12, 0), x_dir=(1, 0, 0), z_dir=(0, 1, 0))):
        with Locations((23.382685902, 13.5)):
            Circle(SKETCH29_R)
        with Locations((0, -27)):
            Circle(SKETCH29_R)
        with Locations((-23.382685902, 13.5)):
            Circle(SKETCH29_R)
    extrude(amount=-CUT_EXTRUDE10_DEPTH, mode=Mode.SUBTRACT)


solid = part.part
